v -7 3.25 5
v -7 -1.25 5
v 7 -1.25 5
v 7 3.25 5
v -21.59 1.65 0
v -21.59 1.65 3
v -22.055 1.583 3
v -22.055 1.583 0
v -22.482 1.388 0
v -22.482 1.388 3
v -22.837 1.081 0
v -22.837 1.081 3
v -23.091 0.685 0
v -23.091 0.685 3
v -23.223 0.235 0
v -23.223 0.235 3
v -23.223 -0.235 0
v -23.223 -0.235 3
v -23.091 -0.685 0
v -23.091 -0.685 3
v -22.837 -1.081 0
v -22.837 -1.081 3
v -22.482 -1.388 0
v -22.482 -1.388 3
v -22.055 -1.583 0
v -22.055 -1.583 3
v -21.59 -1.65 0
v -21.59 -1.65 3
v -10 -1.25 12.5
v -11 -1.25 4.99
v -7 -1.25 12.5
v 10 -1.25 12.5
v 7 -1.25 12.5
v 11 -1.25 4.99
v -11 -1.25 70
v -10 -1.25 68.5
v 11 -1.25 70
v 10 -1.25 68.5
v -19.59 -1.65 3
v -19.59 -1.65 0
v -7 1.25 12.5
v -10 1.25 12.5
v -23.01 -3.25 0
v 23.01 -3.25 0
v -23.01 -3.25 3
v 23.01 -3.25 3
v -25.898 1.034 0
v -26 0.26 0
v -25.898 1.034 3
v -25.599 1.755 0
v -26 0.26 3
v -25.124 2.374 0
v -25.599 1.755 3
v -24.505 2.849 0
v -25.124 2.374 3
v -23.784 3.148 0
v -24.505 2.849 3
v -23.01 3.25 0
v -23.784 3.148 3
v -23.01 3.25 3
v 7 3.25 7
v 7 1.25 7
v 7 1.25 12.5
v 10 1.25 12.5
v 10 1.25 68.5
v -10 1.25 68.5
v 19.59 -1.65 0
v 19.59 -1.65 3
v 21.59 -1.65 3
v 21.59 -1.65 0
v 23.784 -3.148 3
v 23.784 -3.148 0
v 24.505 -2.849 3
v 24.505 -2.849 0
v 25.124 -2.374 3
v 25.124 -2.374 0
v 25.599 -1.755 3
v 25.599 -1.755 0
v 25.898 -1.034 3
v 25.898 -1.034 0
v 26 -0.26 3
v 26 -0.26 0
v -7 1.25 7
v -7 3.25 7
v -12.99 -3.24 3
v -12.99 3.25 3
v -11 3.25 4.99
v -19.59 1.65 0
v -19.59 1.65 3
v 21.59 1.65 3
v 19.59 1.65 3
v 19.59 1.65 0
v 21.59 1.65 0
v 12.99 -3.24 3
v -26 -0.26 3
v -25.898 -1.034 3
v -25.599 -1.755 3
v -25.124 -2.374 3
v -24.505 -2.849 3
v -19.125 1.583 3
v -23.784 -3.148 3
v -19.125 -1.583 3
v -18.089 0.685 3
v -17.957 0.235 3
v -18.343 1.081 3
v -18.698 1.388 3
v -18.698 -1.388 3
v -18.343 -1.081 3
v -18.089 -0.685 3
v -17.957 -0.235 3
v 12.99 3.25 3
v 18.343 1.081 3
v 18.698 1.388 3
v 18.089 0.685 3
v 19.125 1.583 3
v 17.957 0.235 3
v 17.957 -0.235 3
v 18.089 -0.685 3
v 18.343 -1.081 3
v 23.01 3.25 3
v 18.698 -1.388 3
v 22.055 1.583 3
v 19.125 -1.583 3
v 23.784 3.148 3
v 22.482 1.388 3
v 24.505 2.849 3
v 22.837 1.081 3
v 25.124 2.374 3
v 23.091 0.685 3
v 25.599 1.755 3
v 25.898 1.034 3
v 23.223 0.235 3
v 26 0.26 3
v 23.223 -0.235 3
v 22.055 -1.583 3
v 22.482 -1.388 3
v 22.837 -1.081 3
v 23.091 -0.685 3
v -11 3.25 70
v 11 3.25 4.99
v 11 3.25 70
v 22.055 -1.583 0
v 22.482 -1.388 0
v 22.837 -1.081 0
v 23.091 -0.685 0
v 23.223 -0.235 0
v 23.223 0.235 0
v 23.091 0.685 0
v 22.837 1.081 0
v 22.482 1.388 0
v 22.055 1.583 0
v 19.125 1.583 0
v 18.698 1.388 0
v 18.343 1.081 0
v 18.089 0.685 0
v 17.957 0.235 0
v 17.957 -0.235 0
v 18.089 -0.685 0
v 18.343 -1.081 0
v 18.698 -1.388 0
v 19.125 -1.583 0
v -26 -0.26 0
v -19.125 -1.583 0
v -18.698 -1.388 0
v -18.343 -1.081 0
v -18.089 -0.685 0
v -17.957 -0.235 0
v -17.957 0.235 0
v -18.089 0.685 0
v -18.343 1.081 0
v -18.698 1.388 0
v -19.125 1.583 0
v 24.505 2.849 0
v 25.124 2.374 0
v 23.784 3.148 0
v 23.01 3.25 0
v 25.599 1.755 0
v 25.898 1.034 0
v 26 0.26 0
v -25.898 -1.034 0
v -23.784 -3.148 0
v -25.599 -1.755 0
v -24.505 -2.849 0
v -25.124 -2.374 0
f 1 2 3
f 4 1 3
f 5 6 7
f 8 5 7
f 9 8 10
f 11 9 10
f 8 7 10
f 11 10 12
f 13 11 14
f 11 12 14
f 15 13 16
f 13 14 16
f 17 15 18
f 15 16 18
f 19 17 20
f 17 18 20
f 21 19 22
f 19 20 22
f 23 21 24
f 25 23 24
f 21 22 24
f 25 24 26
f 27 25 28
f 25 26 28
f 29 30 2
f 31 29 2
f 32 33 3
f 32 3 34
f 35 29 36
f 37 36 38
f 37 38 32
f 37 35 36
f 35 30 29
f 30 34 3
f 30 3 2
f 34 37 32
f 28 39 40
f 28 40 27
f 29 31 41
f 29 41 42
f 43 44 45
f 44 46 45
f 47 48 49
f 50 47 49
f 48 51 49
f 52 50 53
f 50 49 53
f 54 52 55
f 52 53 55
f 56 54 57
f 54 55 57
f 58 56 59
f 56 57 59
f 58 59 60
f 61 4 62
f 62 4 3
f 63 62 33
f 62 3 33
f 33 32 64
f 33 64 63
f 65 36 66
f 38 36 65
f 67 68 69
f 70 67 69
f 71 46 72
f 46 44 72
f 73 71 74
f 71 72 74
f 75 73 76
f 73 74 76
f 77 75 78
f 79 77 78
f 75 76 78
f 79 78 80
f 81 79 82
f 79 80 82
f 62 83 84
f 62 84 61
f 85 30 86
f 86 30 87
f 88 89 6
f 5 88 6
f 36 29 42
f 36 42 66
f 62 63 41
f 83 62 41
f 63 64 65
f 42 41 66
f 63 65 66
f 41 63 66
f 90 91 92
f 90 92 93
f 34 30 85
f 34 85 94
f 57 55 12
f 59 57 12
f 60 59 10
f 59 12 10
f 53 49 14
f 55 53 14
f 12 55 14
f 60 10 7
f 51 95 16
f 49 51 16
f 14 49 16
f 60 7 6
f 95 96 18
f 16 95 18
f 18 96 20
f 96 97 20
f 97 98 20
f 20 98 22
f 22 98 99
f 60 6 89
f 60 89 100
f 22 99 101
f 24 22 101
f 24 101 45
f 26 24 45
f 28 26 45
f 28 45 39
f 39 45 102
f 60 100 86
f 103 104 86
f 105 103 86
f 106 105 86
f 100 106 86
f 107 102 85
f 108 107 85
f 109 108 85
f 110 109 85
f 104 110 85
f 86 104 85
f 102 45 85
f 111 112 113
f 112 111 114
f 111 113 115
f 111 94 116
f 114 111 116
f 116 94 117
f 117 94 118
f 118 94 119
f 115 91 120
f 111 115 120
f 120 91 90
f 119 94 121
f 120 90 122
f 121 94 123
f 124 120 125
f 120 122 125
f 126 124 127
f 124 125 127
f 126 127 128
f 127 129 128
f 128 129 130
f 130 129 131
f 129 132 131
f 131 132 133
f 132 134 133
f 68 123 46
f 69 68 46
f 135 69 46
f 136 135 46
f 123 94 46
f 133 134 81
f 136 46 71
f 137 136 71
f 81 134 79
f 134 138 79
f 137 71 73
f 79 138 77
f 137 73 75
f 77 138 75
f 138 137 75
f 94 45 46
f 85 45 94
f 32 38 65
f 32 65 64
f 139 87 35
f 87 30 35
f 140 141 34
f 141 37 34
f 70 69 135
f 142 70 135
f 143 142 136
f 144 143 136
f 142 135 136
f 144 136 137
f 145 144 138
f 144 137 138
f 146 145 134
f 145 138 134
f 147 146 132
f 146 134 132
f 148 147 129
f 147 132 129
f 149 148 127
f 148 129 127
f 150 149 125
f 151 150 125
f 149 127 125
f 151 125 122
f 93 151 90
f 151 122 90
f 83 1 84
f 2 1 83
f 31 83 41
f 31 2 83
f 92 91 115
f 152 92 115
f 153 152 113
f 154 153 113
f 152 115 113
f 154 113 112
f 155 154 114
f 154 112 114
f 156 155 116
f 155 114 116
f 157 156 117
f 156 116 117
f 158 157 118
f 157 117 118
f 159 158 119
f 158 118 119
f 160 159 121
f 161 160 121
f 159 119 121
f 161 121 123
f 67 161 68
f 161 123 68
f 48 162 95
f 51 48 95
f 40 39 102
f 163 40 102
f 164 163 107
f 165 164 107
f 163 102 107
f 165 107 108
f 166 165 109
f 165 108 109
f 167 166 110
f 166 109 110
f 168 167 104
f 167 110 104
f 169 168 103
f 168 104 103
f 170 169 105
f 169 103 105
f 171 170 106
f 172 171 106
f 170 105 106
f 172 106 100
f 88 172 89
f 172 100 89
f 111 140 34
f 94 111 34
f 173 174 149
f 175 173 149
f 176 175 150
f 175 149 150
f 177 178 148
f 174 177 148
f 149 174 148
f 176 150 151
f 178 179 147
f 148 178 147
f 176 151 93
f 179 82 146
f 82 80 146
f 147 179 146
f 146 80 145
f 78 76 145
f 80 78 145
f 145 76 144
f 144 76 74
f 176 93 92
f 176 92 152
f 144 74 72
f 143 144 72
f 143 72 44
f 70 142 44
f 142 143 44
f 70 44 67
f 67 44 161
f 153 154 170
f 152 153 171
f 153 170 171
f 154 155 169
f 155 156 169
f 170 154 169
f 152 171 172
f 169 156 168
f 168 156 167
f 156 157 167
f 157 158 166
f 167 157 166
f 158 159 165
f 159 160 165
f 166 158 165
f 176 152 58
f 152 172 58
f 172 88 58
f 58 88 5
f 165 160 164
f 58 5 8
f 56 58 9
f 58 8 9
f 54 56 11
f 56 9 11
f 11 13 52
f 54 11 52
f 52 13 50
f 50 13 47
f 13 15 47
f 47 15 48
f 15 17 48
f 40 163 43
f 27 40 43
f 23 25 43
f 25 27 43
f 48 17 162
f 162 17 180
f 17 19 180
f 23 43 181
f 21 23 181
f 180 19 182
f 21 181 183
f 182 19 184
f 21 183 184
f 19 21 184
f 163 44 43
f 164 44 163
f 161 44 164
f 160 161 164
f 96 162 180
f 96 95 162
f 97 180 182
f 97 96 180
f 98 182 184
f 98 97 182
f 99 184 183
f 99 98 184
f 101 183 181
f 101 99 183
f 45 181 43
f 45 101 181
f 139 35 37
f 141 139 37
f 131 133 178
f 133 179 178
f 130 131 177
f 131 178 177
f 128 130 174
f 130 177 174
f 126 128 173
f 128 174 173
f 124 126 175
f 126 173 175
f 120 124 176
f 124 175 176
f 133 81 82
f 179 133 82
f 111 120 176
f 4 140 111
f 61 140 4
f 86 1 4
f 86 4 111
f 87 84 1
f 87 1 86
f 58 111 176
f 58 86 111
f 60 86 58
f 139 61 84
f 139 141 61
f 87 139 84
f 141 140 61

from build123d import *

# Parameters (mm, degrees)
SKETCH_W        = 14
SKETCH_H        = 2
PAD_DEPTH       = 3.25
SKETCH001_W     = 22
SKETCH001_H     = 70
POCKET_DEPTH    = 2
POCKET001_DEPTH = 2.5
POCKET002_DEPTH = 3.001
CHAMFER_SIZE    = 1.99
CHAMFER001_SIZE = 1.99
FILLET_R        = 2.99


with BuildPart() as part:
    # Sketch → Pad (new body, symmetric)
    with BuildSketch(Plane.XZ):
        Polygon((-26, 0), (-26, 3), (-11, 3), (-11, 70), (11, 70), (11, 3), (26, 3), (26, 0), align=None)
        with Locations((0, 6)):
            Rectangle(SKETCH_W, SKETCH_H, mode=Mode.SUBTRACT)
    extrude(amount=PAD_DEPTH, both=True)

    # Sketch001 (on Face14 of Pad) → Pocket (cut)
    with BuildSketch(Plane.XZ.offset(3.25)):
        with Locations((0, 38)):
            Rectangle(SKETCH001_W, SKETCH001_H)
    extrude(amount=-POCKET_DEPTH, mode=Mode.SUBTRACT)

    # Sketch002 (on Face16 of Pocket) → Pocket001 (cut)
    with BuildSketch(Plane.XZ.offset(1.25)):
        Polygon((-10, 68.5), (10, 68.5), (10, 12.5), (7, 12.5), (7, 7), (-7, 7), (-7, 12.5), (-10, 12.5), align=None)
    extrude(amount=-POCKET001_DEPTH, mode=Mode.SUBTRACT)

    # Sketch003 (on Face3 of Pocket001) → Pocket002 (cut, through all)
    with BuildSketch(Plane(origin=(0, 0, 3), x_dir=(-1, 0, 0), z_dir=(0, 0, 1))):
        with BuildLine():
            ThreePointArc((-19.59, -1.65), (-17.94, 0), (-19.59, 1.65))
            Line((-19.59, 1.65), (-21.59, 1.65))
            ThreePointArc((-21.59, 1.65), (-23.24, 0), (-21.59, -1.65))
            Line((-19.59, -1.65), (-21.59, -1.65))
        make_face()
        with BuildLine():
            ThreePointArc((19.59, 1.65), (17.94, 0), (19.59, -1.65))
            Line((19.59, -1.65), (21.59, -1.65))
            ThreePointArc((21.59, -1.65), (23.24, 0), (21.59, 1.65))
            Line((19.59, 1.65), (21.59, 1.65))
        make_face()
    extrude(amount=-POCKET002_DEPTH, mode=Mode.SUBTRACT)

    # Chamfer
    chamfer_edges = [part.edges().sort_by_distance(p)[0] for p in [
        (0, -1.25, 3),
    ]]
    chamfer(chamfer_edges, length=CHAMFER_SIZE)

    # Chamfer001
    chamfer001_edges = [part.edges().sort_by_distance(p)[0] for p in [
        (-11, 1, 3),
        (11, 1, 3),
    ]]
    chamfer(chamfer001_edges, length=CHAMFER001_SIZE)

    # Fillet
    fillet_edges = [part.edges().sort_by_distance(p)[0] for p in [
        (-26, 3.25, 1.5),
        (-26, -3.25, 1.5),
        (26, -3.25, 1.5),
        (26, 3.25, 1.5),
    ]]
    fillet(fillet_edges, radius=FILLET_R)


solid = part.part
